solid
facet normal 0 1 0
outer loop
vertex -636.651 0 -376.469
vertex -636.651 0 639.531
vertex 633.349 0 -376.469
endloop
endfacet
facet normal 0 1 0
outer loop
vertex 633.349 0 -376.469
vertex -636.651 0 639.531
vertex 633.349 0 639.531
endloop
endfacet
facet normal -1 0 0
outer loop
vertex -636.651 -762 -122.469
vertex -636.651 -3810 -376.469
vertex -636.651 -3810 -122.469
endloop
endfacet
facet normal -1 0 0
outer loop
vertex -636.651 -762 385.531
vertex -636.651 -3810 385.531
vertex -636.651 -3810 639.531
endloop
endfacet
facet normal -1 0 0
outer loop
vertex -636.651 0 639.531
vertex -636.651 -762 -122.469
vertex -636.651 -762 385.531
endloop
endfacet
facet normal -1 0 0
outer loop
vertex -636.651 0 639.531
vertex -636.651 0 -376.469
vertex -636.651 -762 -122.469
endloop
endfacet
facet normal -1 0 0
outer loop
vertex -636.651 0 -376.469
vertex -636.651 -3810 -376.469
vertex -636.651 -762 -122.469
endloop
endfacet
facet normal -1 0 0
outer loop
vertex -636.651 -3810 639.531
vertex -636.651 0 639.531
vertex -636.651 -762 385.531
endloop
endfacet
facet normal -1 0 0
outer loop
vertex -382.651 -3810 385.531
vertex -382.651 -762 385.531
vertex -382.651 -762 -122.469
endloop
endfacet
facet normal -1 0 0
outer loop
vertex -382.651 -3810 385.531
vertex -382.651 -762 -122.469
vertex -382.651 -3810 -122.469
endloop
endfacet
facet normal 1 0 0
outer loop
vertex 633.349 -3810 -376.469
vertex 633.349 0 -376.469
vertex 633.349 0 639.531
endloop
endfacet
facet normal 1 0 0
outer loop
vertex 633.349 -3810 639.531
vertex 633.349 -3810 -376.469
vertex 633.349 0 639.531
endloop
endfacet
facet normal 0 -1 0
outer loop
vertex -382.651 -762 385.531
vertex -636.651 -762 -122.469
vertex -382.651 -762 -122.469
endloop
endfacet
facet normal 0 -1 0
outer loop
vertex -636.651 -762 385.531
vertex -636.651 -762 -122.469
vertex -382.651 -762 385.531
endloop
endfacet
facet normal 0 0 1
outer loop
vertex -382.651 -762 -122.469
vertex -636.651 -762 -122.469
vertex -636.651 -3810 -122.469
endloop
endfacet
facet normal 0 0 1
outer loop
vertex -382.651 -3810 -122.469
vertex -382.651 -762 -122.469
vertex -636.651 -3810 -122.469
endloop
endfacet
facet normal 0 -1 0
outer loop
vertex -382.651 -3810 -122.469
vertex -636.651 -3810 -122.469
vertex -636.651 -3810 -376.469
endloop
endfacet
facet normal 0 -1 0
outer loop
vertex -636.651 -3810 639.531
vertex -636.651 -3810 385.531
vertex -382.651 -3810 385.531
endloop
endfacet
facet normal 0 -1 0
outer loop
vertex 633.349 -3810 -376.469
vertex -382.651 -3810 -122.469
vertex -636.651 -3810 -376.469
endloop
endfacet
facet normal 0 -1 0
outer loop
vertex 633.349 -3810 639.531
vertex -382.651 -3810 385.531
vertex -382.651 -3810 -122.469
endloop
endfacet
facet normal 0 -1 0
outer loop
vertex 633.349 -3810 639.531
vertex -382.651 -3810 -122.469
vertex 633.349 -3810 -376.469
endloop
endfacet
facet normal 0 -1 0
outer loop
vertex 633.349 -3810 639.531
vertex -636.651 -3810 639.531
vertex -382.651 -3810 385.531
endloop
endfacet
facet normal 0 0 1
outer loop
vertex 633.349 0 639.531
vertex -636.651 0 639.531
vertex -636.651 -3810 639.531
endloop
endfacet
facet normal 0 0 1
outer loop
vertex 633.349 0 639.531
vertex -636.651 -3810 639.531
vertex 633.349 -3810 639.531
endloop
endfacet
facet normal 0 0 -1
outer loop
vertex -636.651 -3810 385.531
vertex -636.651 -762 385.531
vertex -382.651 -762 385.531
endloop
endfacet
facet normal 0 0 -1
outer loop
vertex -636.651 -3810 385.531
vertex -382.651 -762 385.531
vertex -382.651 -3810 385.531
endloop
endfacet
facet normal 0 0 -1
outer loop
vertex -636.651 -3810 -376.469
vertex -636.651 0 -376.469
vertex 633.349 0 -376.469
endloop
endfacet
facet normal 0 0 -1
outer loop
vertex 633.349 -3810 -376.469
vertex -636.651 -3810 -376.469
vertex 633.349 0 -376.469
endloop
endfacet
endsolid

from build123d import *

# Parameters (mm, degrees)
F0_W     = 1270
F0_H     = 1016
F1_DEPTH = 3810
F2_W     = 3048
F2_H     = 508
F3_DEPTH = 254


with BuildPart() as f1:
    # F0 (on Front) → F1 (new body)
    with BuildSketch(Plane.XZ):
        with Locations((-1.650825, 131.530831)):
            Rectangle(F0_W, F0_H)
    extrude(amount=F1_DEPTH)


with BuildPart() as f3:
    # F2 (on face) → F3 (new body)
    with BuildSketch(Plane(origin=(-636.650825, 0, 0), x_dir=(0, -1, 0), z_dir=(-1, 0, 0))):
        with Locations((2286, 131.530831)):
            Rectangle(F2_W, F2_H)
    extrude(amount=-F3_DEPTH)


with BuildPart() as f1_1:
    add(f1.part)

    # F4: cut F3
    add(f3.part, mode=Mode.SUBTRACT)


solid = f1_1.part
